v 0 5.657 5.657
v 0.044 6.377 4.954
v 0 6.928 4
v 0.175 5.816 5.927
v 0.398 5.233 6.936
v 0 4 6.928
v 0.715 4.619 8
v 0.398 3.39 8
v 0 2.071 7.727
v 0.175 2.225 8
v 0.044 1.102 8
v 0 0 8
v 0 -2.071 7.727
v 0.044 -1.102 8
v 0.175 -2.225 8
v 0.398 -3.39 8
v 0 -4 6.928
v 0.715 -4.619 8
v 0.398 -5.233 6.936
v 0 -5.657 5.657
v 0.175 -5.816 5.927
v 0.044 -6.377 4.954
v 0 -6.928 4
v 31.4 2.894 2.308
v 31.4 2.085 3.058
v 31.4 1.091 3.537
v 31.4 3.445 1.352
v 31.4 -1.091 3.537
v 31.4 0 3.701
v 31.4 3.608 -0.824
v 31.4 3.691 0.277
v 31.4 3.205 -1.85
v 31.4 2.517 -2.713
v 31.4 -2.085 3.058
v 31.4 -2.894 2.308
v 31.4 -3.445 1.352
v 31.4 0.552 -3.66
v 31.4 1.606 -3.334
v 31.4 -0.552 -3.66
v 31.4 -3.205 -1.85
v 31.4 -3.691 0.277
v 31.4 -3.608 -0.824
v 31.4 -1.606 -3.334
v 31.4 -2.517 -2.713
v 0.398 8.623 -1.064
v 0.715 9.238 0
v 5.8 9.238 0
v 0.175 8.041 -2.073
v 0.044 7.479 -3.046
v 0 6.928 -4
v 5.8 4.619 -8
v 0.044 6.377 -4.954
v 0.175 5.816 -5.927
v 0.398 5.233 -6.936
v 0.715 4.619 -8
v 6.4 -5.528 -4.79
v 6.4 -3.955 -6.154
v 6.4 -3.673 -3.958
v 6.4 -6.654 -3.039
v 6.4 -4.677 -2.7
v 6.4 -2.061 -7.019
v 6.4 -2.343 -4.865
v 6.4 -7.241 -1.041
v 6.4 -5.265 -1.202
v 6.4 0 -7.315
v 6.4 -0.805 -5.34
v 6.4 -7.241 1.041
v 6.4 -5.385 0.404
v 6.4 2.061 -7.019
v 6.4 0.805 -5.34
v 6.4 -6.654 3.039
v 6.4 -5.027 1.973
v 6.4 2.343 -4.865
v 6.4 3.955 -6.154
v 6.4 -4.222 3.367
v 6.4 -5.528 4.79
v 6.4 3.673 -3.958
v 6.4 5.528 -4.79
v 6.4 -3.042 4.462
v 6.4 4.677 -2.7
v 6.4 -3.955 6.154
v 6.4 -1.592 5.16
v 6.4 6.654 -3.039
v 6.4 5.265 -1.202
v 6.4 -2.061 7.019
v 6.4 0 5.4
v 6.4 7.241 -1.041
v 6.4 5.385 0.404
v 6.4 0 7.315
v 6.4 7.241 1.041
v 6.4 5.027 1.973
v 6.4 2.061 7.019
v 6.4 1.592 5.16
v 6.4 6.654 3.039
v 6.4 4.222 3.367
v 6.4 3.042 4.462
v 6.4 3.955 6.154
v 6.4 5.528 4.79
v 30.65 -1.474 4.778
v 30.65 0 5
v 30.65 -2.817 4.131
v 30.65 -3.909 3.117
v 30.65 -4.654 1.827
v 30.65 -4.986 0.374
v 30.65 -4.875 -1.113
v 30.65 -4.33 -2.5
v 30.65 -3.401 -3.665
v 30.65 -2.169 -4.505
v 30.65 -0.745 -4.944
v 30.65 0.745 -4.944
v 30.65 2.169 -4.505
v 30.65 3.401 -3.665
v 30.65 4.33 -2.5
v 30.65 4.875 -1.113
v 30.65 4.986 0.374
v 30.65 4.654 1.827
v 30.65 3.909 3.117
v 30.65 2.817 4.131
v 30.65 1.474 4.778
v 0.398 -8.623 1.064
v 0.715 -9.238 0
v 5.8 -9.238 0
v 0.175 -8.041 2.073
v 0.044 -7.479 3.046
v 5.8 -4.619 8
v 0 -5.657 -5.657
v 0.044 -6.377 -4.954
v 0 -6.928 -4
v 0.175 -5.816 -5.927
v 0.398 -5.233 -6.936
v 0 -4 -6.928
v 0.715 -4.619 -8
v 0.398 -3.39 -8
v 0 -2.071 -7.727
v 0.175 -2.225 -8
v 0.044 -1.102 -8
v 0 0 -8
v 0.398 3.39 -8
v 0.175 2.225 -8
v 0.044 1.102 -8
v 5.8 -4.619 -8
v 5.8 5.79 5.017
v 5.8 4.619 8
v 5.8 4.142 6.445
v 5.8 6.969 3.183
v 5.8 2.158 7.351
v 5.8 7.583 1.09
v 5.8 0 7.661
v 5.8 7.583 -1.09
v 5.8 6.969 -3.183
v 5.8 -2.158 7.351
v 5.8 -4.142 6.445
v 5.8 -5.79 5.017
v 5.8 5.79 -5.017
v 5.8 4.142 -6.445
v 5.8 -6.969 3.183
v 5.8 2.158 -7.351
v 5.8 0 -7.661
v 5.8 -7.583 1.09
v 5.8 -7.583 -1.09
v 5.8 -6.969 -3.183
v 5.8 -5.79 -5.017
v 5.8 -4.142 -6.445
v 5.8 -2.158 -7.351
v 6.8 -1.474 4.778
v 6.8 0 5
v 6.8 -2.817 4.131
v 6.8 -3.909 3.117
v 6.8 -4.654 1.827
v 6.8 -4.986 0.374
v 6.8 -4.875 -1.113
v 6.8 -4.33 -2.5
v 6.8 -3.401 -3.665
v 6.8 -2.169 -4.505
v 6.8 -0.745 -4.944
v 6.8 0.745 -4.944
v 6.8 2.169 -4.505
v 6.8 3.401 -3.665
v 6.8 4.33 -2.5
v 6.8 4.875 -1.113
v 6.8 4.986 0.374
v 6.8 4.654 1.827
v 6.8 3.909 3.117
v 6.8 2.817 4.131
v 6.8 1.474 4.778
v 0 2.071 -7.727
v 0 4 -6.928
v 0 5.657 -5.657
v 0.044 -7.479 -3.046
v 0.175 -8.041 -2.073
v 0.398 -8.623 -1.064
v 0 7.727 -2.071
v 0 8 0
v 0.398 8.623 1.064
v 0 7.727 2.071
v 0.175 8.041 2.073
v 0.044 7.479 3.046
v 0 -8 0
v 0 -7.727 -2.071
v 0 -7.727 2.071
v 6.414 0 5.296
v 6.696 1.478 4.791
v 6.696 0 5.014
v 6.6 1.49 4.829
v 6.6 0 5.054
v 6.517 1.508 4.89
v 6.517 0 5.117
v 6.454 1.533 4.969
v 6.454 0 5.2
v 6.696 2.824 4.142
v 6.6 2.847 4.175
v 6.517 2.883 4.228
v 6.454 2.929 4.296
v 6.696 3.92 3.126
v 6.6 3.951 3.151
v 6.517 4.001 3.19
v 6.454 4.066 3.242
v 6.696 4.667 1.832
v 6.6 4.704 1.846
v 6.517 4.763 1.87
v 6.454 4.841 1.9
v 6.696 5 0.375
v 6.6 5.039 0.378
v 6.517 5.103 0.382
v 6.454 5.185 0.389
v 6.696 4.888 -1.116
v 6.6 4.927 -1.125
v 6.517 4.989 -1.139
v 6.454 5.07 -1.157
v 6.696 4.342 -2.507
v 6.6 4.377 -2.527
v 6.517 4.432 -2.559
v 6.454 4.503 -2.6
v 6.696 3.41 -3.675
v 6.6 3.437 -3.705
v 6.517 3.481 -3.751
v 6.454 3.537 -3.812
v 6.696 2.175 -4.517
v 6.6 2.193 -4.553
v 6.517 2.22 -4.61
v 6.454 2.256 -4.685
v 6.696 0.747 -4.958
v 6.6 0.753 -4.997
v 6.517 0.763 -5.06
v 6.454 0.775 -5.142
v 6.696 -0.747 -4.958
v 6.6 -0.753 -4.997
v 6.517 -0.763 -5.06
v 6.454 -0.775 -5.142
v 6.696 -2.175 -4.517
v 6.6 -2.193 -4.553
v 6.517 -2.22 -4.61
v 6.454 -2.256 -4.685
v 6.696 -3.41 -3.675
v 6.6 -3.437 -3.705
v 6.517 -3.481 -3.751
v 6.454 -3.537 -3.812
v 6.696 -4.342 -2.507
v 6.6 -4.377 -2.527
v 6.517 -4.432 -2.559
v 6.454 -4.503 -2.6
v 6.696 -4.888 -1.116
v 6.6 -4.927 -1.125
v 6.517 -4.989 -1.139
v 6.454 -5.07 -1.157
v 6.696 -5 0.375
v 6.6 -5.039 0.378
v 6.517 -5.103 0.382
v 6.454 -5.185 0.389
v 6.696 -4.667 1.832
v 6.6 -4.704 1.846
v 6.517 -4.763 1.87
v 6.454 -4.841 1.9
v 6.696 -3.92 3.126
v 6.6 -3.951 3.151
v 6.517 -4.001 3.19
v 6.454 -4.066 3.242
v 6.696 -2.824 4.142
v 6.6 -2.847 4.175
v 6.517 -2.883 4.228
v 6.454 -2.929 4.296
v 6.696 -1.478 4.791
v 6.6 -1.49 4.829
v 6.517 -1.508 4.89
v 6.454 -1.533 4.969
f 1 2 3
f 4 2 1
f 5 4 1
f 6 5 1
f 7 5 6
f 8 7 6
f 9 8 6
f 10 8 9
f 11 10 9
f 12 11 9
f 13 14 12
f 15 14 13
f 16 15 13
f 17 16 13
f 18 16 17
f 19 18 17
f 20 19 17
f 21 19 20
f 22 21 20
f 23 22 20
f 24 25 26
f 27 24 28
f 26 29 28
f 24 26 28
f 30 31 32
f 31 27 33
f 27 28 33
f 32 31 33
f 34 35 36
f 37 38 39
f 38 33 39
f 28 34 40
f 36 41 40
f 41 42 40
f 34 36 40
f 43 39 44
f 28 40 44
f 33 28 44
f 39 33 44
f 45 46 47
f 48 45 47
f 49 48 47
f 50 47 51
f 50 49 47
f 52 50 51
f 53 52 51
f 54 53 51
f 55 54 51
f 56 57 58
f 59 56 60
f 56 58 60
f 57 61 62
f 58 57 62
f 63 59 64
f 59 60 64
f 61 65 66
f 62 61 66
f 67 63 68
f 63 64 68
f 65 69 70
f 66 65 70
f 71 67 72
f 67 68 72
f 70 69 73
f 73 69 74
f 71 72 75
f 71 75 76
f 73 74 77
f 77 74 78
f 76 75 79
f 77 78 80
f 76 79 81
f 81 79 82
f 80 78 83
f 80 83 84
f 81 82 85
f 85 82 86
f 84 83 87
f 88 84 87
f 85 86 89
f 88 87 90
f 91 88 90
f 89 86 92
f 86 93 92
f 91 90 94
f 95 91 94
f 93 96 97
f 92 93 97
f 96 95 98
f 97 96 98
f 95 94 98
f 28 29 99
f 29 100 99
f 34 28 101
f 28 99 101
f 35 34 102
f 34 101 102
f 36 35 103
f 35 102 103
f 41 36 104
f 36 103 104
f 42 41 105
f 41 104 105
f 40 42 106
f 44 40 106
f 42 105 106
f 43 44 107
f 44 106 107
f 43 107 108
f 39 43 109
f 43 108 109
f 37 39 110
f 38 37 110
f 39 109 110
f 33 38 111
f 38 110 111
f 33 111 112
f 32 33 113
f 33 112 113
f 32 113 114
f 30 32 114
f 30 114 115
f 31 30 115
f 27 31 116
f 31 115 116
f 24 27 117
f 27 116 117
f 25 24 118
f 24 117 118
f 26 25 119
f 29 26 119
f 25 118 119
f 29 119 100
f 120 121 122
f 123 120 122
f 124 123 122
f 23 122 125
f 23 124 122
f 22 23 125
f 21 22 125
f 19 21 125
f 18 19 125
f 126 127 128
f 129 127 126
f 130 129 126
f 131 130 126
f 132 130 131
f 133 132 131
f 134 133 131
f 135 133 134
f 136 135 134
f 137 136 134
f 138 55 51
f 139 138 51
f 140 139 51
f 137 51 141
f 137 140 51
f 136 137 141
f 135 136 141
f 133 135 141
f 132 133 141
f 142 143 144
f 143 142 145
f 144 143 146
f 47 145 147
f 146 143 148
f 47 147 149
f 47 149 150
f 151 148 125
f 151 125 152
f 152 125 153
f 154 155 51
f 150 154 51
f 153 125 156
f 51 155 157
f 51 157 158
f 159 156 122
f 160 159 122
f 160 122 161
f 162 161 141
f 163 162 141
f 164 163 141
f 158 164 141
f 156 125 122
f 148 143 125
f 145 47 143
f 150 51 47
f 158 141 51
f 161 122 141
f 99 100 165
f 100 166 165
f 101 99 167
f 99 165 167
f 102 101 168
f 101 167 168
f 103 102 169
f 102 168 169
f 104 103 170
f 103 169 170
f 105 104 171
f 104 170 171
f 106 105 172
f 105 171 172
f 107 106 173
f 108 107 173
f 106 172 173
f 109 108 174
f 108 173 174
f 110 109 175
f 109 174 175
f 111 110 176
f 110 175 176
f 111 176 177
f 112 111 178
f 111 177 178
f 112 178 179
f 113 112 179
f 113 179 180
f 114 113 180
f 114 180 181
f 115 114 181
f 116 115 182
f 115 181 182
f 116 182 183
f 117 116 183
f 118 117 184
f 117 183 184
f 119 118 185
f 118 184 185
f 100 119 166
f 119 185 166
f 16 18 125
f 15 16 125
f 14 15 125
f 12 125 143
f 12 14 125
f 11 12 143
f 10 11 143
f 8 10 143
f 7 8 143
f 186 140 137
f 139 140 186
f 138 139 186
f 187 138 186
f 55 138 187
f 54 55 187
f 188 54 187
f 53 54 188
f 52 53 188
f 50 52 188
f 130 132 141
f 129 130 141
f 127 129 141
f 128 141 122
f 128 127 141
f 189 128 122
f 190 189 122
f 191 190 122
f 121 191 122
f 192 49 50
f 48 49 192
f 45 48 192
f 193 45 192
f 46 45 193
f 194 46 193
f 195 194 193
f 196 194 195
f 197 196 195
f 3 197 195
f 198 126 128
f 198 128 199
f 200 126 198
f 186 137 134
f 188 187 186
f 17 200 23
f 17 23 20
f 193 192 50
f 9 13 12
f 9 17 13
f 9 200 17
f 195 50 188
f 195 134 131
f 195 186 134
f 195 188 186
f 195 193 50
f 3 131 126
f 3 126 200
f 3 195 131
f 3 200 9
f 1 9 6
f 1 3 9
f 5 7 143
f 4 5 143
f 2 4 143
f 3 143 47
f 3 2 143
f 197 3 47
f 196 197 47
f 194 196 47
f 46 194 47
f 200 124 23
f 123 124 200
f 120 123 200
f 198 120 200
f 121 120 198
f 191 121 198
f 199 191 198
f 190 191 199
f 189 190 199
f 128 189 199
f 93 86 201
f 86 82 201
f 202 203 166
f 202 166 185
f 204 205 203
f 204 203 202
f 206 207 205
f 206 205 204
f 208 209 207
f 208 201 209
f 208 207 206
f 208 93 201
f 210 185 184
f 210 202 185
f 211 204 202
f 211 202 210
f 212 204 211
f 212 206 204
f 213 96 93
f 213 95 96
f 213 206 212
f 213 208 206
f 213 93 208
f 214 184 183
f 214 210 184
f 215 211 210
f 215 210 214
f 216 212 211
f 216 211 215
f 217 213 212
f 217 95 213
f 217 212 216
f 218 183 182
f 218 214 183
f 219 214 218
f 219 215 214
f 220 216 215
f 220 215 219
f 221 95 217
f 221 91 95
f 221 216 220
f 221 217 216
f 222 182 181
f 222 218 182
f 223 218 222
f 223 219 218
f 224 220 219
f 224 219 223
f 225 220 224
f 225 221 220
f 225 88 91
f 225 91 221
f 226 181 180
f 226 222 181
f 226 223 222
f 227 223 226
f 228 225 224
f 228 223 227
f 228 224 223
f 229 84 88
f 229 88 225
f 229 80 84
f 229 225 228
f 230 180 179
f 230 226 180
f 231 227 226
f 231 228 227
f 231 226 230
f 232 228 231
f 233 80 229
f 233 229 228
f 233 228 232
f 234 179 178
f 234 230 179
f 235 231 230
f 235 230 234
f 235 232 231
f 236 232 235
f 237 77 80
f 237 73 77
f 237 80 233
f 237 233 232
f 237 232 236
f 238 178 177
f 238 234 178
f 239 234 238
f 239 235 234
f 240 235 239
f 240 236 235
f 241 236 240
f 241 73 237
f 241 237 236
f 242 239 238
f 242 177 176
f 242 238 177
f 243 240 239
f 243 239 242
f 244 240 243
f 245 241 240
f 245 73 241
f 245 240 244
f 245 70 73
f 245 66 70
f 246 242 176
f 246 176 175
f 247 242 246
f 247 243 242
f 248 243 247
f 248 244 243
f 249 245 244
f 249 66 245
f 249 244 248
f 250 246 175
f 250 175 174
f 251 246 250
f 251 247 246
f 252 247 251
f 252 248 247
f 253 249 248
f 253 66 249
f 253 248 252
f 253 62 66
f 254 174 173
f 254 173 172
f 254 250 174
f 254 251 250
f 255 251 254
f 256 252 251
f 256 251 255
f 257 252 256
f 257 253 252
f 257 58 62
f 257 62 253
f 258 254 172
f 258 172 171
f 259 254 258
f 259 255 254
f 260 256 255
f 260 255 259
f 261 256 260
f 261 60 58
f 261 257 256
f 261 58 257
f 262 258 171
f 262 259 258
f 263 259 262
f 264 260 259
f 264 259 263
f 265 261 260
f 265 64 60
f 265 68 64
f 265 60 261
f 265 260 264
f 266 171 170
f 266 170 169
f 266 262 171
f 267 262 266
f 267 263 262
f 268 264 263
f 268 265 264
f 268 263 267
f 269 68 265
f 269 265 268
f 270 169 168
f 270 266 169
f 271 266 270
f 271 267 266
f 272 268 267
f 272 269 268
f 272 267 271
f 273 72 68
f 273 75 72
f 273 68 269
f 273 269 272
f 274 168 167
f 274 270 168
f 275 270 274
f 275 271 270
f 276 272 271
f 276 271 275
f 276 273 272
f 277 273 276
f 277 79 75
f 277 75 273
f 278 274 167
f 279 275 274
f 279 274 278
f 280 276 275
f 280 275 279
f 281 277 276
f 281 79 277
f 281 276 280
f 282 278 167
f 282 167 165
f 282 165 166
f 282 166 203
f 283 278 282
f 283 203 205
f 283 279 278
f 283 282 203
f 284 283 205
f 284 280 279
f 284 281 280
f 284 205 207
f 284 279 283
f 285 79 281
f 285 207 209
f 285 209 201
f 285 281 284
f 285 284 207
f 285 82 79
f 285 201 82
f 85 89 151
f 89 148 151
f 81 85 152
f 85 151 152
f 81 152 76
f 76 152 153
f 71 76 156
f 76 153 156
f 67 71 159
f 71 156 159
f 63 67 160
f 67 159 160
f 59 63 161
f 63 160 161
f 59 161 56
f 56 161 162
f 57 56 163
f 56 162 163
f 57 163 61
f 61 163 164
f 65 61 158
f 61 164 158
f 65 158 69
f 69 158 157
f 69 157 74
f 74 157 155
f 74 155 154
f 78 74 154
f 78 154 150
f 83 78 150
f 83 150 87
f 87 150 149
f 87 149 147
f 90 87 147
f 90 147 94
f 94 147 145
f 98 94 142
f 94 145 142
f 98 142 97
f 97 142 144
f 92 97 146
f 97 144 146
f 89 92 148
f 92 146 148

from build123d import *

# Parameters (mm, degrees)
EXTRUDE_388_DEPTH = 6.4
FILLET_1259_R     = 0.4


with BuildPart() as part:
    # 草图1 → Extrude 388 (new body)
    with BuildSketch(Plane(origin=(0, 0, 0), x_dir=(0, 0, -1), z_dir=(1, 0, 0))):
        Polygon((8, 4.618802154), (8, -4.618802154), (0, -9.237604307), (-8, -4.618802154), (-8, 4.618802154), (0, 9.237604307), align=None)
    extrude(amount=EXTRUDE_388_DEPTH)

    # 草图2 → 凸台-旋转1 (revolve)
    with BuildSketch(Plane.XY, mode=Mode.PRIVATE) as revolve_1_sk:
        Polygon((0, 0), (31.4, 0), (31.4, 3.701), (31.4, 5), (0, 5), align=None)
    revolve(revolve_1_sk.sketch.rotate(Axis((0, 0, 0), (1, 0, 0)), 90), axis=Axis((0, 0, 0), (1, 0, 0)))

    # 草图3 → 切除-旋转1 (revolve, cut)
    with BuildSketch(Plane.XY):
        Polygon((0, 8), (3.601282526, 14.237604307), (3.601282526, 19.237604307), (-10, 19.237604307), (-10, 8), align=None)
    revolve(axis=Axis((0, 0, 0), (1, 0, 0)), mode=Mode.SUBTRACT)

    # 草图4 → 切除-旋转3 (revolve, cut)
    with BuildSketch(Plane.XY, mode=Mode.PRIVATE) as cut_revolve_3_sk:
        Polygon((6.4, 7.315), (5.8, 7.661410162), (5.8, 9.237604307), (6.4, 9.237604307), align=None)
    revolve(cut_revolve_3_sk.sketch.rotate(Axis((0, 0, 0), (1, 0, 0)), 90), axis=Axis((0, 0, 0), (1, 0, 0)), mode=Mode.SUBTRACT)

    # Fillet 1259
    fillet_1259_edges = [part.edges().sort_by_distance(p)[0] for p in [
        (6.4, 0, -5),
    ]]
    fillet(fillet_1259_edges, radius=FILLET_1259_R)

    # 草图6 → 切除-旋转4 (revolve, cut)
    with BuildSketch(Plane.XY, mode=Mode.PRIVATE) as cut_revolve_4_sk:
        Polygon((30.65, 5), (32.15, 5), (31.4, 3.700961894), align=None)
    revolve(cut_revolve_4_sk.sketch.rotate(Axis((0, 0, 0), (1, 0, 0)), 90), axis=Axis((0, 0, 0), (1, 0, 0)), mode=Mode.SUBTRACT)


solid = part.part
